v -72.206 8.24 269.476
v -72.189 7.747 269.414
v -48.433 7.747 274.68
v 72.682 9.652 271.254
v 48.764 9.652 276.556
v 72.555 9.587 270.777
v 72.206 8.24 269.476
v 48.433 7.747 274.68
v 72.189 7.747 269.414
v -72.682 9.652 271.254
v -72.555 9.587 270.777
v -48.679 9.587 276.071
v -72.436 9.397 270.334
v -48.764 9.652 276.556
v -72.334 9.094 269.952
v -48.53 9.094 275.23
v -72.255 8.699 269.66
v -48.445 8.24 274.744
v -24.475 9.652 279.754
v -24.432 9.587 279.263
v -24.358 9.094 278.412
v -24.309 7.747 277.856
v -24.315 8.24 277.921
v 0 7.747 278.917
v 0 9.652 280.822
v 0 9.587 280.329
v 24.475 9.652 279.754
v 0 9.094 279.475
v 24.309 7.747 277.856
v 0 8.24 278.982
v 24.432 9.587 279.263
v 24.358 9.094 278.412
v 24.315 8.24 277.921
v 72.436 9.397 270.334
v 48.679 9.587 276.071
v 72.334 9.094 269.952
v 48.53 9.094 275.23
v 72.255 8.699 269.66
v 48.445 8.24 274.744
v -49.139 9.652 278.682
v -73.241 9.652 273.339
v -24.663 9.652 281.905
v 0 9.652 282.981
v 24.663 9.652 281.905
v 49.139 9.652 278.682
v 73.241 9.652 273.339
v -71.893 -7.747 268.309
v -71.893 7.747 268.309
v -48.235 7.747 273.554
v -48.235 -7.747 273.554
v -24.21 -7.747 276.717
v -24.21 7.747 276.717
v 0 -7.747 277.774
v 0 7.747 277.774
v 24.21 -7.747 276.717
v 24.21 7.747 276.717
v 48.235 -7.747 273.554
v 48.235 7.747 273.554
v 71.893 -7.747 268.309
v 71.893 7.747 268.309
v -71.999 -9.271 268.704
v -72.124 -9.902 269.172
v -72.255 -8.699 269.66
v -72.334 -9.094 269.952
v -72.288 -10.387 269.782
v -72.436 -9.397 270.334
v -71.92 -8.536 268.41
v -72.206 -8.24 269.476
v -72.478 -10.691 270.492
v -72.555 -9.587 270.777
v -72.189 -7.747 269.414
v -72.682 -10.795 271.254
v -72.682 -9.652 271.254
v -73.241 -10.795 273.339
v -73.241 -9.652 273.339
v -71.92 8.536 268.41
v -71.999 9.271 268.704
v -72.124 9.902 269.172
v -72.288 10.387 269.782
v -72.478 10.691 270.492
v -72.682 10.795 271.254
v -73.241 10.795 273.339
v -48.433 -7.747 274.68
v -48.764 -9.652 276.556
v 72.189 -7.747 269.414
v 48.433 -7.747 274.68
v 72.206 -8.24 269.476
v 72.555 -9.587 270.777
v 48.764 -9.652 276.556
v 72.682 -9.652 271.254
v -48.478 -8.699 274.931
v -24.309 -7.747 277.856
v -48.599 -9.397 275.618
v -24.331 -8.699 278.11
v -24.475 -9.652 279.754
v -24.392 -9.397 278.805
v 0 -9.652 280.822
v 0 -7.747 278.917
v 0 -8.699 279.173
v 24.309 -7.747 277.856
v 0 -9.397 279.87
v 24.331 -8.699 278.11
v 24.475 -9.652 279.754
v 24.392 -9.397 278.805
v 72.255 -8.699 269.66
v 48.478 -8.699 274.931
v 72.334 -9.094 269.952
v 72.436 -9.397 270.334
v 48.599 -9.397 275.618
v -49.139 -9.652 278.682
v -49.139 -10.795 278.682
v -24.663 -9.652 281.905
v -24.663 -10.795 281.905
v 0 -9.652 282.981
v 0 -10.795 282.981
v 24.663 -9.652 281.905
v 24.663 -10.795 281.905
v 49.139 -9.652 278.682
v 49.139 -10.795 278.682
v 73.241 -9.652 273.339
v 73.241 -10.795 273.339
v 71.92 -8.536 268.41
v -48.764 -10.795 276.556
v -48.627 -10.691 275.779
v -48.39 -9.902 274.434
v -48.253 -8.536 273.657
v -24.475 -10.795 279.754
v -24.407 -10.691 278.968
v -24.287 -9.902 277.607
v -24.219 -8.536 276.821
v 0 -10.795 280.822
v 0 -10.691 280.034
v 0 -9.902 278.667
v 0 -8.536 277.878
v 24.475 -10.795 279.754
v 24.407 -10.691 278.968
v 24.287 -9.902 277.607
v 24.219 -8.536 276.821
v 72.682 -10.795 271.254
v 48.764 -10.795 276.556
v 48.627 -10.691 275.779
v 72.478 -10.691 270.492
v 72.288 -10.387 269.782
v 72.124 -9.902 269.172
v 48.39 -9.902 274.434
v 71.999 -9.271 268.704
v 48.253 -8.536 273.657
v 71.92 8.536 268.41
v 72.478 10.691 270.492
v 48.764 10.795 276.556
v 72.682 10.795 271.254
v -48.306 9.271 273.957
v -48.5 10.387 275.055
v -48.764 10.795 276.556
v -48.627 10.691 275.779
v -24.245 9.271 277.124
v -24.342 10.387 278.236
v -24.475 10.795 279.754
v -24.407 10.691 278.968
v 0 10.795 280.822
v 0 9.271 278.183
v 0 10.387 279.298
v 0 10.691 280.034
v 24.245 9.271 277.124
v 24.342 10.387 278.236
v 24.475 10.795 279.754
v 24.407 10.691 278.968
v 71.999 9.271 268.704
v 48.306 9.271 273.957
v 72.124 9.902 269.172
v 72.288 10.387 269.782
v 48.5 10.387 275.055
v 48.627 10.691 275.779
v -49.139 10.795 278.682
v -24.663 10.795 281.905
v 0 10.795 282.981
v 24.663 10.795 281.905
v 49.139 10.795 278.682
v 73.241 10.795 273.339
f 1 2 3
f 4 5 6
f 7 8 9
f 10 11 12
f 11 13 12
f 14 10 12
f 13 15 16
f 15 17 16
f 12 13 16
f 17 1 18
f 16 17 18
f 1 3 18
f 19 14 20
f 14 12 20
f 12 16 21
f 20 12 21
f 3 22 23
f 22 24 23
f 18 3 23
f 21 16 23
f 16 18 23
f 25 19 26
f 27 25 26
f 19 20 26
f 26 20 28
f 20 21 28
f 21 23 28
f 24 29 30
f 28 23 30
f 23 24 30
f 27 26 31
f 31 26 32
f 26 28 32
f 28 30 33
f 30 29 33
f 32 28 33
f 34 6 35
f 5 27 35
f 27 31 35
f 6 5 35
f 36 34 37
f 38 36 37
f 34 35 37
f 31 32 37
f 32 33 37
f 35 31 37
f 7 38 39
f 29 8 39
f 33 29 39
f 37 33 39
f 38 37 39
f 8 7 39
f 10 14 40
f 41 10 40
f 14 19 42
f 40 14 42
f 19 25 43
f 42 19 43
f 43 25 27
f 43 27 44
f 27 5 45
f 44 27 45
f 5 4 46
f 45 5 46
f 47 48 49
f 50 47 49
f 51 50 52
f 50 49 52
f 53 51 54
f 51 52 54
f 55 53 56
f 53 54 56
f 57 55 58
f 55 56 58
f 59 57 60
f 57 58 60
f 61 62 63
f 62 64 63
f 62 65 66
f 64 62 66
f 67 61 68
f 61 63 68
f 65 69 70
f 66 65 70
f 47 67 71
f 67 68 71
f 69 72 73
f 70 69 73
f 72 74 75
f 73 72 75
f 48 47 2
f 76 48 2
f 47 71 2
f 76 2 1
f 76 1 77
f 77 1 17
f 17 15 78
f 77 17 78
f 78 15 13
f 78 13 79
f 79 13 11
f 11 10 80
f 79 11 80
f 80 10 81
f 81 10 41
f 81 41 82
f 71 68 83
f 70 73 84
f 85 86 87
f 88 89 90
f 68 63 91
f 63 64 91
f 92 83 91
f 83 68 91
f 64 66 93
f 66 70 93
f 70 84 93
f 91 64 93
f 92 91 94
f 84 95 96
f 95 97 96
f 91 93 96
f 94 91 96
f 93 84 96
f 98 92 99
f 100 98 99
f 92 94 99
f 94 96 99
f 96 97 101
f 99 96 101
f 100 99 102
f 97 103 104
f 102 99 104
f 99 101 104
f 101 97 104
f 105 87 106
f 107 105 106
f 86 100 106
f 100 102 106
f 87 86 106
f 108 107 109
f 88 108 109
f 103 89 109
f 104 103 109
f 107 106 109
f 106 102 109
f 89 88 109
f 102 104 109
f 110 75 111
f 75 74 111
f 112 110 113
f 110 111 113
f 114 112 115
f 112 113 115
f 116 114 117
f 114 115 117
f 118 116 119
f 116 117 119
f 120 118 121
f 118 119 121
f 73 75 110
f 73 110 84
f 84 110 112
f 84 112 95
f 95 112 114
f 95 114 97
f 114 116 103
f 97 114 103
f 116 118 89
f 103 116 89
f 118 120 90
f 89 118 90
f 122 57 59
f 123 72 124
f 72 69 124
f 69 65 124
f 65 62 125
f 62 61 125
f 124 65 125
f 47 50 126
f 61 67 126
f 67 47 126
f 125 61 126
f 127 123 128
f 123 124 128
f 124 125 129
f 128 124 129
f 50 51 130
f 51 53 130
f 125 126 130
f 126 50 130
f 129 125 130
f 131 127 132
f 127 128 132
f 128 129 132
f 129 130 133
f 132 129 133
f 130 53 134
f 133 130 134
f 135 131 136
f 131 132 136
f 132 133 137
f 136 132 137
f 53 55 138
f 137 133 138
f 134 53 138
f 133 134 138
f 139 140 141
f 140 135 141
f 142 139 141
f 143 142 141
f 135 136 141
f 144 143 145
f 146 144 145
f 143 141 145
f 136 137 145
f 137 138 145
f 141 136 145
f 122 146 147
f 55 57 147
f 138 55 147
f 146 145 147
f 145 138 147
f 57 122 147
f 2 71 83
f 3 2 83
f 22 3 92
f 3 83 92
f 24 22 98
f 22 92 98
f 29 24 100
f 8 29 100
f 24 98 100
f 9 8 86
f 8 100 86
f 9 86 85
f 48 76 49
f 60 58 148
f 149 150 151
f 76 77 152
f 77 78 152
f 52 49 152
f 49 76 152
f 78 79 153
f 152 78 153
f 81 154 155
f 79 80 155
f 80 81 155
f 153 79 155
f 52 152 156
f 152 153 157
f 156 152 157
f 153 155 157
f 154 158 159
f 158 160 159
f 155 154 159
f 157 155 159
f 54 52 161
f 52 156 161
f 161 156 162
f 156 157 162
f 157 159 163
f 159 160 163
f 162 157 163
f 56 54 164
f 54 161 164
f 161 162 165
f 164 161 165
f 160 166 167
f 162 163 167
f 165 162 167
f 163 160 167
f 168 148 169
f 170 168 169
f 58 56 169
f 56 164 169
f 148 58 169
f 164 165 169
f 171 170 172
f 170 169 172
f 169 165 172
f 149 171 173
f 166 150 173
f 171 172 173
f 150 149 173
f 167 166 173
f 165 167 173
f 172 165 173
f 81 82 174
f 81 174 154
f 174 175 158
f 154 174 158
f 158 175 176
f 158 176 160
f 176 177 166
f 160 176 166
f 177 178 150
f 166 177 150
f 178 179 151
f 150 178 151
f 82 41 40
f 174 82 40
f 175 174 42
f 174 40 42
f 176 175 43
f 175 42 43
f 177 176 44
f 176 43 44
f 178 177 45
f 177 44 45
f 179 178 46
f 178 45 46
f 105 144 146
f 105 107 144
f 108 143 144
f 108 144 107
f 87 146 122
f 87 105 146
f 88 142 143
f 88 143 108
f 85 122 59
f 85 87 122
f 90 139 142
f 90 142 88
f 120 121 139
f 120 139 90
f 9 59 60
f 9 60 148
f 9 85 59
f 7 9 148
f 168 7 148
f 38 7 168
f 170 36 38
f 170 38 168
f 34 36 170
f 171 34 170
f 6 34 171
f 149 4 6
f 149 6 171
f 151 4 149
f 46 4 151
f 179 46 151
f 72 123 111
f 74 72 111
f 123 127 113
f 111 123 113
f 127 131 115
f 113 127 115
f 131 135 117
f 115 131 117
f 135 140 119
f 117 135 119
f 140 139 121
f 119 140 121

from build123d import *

# Parameters (mm, degrees)
F3_ANGLE = 30


with BuildPart() as f3:
    # F1 (on Right) → F3 (revolve, symmetric)
    with BuildSketch(Plane.YZ) as f3_sk:
        with BuildLine():
            ThreePointArc((-10.795, 280.8224), (-9.902261, 278.667139), (-7.747, 277.7744))
            Line((-7.747, 277.7744), (7.747, 277.7744))
            ThreePointArc((7.747, 277.7744), (9.902261, 278.667139), (10.795, 280.8224))
            Line((10.795, 280.8224), (10.795, 282.9814))
            Line((10.795, 282.9814), (9.652, 282.9814))
            Line((9.652, 282.9814), (9.652, 280.8224))
            ThreePointArc((9.652, 280.8224), (9.094038, 279.475362), (7.747, 278.9174))
            Line((7.747, 278.9174), (-7.747, 278.9174))
            ThreePointArc((-7.747, 278.9174), (-9.094038, 279.475362), (-9.652, 280.8224))
            Line((-9.652, 280.8224), (-9.652, 282.9814))
            Line((-9.652, 282.9814), (-10.795, 282.9814))
            Line((-10.795, 282.9814), (-10.795, 280.8224))
        make_face()
    revolve(axis=Axis((0, -102.103345, 0), (0, -1, 0)), revolution_arc=F3_ANGLE / 2)
    revolve(f3_sk.sketch, axis=Axis((0, -102.103345, 0), (0, 1, 0)), revolution_arc=F3_ANGLE / 2)


solid = f3.part
